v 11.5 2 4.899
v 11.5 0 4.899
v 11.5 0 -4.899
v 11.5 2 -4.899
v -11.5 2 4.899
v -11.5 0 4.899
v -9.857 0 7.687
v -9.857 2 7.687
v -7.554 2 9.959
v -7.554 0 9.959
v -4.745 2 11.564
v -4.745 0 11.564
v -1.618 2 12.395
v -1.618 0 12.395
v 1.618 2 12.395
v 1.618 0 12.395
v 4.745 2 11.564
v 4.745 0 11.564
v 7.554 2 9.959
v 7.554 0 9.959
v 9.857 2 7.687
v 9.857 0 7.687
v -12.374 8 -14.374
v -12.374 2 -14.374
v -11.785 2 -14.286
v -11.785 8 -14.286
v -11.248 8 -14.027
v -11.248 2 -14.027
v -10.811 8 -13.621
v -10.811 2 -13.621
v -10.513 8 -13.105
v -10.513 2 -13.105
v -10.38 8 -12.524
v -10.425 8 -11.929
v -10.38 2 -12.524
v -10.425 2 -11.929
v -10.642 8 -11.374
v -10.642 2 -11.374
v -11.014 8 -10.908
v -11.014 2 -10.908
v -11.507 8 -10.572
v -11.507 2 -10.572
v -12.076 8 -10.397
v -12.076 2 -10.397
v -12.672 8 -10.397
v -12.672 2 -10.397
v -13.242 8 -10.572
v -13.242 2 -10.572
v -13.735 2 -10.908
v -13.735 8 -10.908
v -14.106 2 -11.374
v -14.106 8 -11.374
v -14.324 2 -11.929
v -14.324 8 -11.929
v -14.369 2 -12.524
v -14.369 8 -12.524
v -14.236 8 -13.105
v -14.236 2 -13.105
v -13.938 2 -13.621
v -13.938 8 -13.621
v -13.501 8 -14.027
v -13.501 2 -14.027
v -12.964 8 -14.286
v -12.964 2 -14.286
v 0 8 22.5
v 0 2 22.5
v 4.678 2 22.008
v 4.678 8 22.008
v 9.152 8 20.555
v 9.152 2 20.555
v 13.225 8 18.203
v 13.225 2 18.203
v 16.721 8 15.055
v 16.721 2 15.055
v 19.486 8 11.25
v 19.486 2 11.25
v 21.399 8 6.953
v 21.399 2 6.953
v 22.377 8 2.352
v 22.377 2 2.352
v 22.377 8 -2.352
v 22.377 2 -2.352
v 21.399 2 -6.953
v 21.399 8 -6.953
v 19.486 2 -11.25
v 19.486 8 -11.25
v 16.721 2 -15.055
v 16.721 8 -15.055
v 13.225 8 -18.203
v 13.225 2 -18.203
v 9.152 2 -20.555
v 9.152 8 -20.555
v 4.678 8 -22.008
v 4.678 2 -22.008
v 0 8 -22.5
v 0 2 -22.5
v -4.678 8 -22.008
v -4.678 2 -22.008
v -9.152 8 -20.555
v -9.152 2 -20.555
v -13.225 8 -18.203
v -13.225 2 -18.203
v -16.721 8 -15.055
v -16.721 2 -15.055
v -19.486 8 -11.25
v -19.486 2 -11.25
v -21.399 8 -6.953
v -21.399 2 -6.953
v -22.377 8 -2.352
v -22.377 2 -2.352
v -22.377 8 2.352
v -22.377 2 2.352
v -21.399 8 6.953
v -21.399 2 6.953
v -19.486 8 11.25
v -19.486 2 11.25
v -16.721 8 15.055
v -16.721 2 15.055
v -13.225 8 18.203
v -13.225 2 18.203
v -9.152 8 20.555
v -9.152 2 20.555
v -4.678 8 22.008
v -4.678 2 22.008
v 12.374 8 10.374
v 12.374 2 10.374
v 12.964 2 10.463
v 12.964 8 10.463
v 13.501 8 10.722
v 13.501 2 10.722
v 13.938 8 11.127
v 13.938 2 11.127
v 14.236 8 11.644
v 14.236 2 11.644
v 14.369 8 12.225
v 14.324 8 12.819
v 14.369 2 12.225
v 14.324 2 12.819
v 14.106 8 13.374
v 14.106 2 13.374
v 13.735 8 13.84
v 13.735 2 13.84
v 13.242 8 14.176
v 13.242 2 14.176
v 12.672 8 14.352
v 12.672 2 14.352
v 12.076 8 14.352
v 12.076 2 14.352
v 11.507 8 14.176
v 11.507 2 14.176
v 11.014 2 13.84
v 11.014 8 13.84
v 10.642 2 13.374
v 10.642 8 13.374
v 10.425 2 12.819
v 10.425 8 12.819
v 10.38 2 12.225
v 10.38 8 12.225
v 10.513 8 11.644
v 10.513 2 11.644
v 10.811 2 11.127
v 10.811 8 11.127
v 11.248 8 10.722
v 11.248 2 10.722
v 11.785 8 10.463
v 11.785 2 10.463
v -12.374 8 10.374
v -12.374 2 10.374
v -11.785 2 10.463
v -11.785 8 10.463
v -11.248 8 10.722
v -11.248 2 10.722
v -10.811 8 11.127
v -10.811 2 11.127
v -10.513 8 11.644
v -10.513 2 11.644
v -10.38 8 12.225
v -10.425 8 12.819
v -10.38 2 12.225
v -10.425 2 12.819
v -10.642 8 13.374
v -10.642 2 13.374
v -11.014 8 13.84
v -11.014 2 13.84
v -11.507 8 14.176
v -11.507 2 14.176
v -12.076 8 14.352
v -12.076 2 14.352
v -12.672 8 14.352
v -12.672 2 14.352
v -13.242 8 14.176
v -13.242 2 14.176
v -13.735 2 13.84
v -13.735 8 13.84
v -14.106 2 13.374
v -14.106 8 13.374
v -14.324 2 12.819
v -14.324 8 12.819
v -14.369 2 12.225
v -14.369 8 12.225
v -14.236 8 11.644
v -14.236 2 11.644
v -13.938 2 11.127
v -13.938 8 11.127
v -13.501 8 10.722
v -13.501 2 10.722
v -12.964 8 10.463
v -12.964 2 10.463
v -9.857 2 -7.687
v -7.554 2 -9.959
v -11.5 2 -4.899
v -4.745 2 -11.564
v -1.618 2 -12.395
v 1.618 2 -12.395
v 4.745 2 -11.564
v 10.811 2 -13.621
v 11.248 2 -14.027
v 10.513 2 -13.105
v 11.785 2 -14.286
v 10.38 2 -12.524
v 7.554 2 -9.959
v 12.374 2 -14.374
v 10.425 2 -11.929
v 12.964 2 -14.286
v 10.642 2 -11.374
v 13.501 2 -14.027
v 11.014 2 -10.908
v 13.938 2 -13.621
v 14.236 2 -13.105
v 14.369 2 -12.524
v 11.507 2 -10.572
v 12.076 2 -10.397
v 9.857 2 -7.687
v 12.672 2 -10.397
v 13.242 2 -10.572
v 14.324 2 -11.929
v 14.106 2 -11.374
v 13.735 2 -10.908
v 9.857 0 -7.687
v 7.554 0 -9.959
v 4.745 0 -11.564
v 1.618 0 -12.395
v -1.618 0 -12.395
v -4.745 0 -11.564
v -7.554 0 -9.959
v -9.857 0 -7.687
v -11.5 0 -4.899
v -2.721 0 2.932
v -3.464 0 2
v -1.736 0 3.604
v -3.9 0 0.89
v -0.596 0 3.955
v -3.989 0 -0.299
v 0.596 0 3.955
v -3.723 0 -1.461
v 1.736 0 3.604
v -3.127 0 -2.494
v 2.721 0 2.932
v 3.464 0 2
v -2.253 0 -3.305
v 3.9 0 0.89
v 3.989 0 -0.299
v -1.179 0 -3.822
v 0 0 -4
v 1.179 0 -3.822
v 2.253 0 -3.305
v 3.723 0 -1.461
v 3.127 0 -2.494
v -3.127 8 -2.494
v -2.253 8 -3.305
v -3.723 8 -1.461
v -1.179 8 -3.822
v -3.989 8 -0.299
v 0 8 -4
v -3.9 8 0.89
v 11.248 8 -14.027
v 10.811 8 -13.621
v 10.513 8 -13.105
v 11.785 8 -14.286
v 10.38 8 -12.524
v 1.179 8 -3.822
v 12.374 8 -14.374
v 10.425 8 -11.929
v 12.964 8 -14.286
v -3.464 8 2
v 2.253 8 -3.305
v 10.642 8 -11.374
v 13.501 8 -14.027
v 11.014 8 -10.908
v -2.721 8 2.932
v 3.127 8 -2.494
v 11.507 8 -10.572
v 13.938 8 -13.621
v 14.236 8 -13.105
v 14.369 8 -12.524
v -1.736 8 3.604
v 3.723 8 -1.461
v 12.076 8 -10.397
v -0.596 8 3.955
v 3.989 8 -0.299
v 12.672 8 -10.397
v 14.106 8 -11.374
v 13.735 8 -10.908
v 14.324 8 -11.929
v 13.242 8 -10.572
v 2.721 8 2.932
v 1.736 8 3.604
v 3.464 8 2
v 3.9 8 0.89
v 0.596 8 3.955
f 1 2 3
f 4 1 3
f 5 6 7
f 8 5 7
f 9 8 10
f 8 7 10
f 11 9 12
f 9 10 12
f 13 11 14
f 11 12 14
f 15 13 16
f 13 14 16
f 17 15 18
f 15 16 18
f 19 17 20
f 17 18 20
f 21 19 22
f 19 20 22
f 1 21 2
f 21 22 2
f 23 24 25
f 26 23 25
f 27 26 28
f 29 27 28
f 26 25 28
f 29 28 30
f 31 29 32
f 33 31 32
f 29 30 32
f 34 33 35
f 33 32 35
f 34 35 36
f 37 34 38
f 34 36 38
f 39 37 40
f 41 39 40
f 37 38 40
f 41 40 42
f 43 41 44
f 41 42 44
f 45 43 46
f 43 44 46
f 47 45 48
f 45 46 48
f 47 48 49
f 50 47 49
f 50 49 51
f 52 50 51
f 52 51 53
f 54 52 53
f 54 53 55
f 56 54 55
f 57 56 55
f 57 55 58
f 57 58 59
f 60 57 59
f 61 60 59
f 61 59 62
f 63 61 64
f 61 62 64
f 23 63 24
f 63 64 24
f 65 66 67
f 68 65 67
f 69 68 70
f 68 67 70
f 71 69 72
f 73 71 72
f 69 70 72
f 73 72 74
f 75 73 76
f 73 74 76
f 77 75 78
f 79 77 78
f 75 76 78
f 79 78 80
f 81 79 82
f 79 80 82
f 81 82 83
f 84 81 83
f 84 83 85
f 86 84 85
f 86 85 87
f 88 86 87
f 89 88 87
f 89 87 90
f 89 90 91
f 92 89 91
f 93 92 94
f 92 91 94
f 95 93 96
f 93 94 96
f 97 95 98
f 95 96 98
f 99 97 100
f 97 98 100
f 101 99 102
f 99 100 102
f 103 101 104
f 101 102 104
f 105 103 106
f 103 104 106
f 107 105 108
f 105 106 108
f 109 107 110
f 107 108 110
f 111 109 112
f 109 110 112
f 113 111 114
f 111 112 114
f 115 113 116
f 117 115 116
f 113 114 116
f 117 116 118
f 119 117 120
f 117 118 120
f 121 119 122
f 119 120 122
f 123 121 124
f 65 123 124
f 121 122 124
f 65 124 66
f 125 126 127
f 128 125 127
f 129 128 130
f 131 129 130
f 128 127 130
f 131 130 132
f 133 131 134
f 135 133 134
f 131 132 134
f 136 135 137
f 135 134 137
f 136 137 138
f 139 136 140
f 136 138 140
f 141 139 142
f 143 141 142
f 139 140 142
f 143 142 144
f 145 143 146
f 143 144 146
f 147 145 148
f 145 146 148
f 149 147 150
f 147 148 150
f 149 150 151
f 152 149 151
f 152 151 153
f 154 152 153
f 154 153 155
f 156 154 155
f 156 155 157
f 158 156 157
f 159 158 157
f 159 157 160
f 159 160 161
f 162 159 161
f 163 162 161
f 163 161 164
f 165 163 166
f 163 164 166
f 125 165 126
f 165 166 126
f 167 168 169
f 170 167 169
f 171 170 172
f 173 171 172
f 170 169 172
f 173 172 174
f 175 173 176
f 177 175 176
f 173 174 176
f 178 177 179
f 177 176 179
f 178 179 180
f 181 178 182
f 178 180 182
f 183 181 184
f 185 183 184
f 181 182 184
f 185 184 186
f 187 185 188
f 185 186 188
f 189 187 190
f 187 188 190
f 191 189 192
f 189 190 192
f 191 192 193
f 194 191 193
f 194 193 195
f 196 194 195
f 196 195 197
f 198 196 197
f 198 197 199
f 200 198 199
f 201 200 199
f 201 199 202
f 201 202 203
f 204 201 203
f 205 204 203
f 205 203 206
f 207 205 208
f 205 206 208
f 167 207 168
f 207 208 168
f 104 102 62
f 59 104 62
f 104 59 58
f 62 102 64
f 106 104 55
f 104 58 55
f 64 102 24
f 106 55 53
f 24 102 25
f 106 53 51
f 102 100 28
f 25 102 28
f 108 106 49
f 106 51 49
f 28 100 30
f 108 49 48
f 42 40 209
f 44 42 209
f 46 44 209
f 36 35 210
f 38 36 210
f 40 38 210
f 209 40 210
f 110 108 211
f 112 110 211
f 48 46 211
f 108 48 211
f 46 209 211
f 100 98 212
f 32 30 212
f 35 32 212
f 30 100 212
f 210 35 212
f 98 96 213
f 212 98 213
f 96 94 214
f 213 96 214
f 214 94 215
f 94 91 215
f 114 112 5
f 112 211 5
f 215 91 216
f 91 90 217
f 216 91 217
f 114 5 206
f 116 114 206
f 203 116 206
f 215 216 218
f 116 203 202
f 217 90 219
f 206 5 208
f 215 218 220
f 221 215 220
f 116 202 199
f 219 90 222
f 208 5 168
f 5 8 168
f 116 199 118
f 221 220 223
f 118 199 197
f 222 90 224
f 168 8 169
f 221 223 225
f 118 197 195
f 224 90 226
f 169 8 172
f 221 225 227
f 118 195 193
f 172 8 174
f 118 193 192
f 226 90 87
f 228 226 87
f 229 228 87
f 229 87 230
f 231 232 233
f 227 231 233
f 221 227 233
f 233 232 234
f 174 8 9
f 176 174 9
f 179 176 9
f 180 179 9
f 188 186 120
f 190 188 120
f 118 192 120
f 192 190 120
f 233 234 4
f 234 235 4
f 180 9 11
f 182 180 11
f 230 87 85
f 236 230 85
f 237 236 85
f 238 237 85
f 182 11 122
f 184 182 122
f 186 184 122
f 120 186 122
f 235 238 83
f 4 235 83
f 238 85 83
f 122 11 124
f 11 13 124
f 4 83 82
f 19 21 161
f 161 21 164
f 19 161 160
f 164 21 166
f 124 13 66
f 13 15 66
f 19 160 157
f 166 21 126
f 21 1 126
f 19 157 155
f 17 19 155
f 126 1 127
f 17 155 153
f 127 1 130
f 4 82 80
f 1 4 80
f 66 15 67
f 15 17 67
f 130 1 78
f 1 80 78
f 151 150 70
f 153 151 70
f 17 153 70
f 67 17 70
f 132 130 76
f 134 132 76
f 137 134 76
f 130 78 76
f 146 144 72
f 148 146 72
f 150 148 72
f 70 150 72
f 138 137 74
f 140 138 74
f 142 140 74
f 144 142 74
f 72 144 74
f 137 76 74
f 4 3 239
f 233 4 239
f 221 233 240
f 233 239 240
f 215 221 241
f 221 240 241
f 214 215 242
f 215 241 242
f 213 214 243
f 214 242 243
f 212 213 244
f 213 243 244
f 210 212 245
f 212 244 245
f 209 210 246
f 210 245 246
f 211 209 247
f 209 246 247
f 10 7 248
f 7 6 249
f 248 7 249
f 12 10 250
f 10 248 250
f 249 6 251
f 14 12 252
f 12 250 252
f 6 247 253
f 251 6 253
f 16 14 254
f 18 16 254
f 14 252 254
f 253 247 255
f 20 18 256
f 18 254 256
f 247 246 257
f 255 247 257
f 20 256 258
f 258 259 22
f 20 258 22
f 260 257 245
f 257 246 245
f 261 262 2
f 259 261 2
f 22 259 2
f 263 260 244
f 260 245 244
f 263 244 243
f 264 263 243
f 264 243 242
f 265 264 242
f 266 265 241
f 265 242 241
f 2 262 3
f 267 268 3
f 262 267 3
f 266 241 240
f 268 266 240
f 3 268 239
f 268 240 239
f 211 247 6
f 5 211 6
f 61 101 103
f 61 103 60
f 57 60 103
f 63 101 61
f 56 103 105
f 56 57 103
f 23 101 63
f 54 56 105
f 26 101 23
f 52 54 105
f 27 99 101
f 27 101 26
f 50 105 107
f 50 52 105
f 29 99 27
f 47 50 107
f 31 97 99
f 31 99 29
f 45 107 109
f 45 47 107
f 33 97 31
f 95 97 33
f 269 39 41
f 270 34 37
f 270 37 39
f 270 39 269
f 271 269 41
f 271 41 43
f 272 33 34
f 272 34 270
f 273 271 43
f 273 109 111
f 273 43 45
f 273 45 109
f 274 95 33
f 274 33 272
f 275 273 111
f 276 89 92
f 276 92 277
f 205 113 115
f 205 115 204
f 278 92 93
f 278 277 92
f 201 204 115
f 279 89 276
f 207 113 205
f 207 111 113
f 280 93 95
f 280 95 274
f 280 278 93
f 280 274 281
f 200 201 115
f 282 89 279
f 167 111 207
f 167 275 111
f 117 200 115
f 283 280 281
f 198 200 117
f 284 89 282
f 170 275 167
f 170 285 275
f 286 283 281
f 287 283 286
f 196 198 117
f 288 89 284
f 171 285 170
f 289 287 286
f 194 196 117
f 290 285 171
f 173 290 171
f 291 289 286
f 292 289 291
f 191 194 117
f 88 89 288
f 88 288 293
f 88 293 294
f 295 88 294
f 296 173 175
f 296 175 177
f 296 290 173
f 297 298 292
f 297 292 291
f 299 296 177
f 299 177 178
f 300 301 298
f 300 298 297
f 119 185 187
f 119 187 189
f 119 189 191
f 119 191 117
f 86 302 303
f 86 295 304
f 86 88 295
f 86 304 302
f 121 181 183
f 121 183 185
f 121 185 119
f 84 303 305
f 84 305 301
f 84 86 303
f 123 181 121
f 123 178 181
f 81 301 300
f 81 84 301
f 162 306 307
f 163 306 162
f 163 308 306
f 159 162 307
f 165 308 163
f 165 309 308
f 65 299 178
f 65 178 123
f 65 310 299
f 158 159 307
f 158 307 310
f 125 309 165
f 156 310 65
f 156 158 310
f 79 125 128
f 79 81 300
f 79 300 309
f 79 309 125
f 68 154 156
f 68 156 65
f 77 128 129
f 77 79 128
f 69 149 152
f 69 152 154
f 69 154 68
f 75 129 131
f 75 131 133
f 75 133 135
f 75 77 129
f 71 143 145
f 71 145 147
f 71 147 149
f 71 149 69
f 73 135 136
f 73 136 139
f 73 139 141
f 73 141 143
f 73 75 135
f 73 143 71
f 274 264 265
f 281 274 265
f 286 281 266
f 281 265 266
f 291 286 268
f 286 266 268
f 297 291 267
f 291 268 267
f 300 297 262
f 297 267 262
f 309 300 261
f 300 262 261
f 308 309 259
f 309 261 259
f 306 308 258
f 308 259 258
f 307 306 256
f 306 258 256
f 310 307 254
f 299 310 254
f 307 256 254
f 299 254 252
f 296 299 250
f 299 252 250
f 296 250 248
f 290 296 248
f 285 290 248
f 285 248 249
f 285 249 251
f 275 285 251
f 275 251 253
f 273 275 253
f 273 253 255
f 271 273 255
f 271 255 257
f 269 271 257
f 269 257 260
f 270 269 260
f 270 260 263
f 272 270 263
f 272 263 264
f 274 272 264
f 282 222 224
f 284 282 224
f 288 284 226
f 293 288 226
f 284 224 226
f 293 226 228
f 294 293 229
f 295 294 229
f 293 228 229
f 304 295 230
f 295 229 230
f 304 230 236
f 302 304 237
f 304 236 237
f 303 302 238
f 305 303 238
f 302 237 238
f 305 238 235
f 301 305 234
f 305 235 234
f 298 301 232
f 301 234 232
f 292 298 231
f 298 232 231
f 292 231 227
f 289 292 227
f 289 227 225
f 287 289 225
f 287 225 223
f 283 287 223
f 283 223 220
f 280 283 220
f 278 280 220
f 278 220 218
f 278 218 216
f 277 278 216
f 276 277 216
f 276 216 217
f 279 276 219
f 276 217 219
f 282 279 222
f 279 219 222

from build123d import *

# Parameters (mm, degrees)
BIT_ATTACHED_TO_SHAFT_DEPTH = 2
SKETCH2_R                   = 22.5
BOSS_EXTRUDE2_DEPTH         = 6
SKETCH3_R                   = 2
CUT_EXTRUDE1_DEPTH          = 6
SKETCH4_R                   = 4
CUT_EXTRUDE2_DEPTH          = 33.810059433


with BuildPart() as part:
    # Sketch1 → bit attached to shaft (new body)
    with BuildSketch(Plane(origin=(0, 0, 0), x_dir=(1, 0, 0), z_dir=(0, 1, 0))):
        with BuildLine():
            Line((11.5, -4.898979486), (11.5, 4.898979486))
            ThreePointArc((11.5, 4.898979486), (0, 12.5), (-11.5, 4.898979486))
            Line((-11.5, 4.898979486), (-11.5, -4.898979486))
            ThreePointArc((-11.5, -4.898979486), (0, -12.5), (11.5, -4.898979486))
        make_face()
    extrude(amount=BIT_ATTACHED_TO_SHAFT_DEPTH)

    # Sketch2 → Boss-Extrude2 (add)
    with BuildSketch(Plane(origin=(0, 2, 0), x_dir=(1, 0, 0), z_dir=(0, 1, 0))):
        with Locations(Location((0, 0, 0), (0, 0, 270))):
            Circle(SKETCH2_R)
    extrude(amount=BOSS_EXTRUDE2_DEPTH)

    # Sketch3 → Cut-Extrude1 (cut)
    with BuildSketch(Plane.XZ.offset(-2)):
        with Locations(Location((-12.374368671, -12.374368671, 0), (0, 0, 270))):
            Circle(SKETCH3_R)
        with Locations(Location((12.374368671, -12.374368671, 0), (0, 0, 270))):
            Circle(SKETCH3_R)
        with Locations(Location((12.374368671, 12.374368671, 0), (0, 0, 270))):
            Circle(SKETCH3_R)
        with Locations(Location((-12.374368671, 12.374368671, 0), (0, 0, 270))):
            Circle(SKETCH3_R)
    extrude(amount=-CUT_EXTRUDE1_DEPTH, mode=Mode.SUBTRACT)

    # Sketch4 → Cut-Extrude2 (cut, through all)
    with BuildSketch(Plane.XZ):
        with Locations(Location((0, 0, 0), (0, 0, 270))):
            Circle(SKETCH4_R)
    extrude(amount=-CUT_EXTRUDE2_DEPTH, mode=Mode.SUBTRACT)


solid = part.part
